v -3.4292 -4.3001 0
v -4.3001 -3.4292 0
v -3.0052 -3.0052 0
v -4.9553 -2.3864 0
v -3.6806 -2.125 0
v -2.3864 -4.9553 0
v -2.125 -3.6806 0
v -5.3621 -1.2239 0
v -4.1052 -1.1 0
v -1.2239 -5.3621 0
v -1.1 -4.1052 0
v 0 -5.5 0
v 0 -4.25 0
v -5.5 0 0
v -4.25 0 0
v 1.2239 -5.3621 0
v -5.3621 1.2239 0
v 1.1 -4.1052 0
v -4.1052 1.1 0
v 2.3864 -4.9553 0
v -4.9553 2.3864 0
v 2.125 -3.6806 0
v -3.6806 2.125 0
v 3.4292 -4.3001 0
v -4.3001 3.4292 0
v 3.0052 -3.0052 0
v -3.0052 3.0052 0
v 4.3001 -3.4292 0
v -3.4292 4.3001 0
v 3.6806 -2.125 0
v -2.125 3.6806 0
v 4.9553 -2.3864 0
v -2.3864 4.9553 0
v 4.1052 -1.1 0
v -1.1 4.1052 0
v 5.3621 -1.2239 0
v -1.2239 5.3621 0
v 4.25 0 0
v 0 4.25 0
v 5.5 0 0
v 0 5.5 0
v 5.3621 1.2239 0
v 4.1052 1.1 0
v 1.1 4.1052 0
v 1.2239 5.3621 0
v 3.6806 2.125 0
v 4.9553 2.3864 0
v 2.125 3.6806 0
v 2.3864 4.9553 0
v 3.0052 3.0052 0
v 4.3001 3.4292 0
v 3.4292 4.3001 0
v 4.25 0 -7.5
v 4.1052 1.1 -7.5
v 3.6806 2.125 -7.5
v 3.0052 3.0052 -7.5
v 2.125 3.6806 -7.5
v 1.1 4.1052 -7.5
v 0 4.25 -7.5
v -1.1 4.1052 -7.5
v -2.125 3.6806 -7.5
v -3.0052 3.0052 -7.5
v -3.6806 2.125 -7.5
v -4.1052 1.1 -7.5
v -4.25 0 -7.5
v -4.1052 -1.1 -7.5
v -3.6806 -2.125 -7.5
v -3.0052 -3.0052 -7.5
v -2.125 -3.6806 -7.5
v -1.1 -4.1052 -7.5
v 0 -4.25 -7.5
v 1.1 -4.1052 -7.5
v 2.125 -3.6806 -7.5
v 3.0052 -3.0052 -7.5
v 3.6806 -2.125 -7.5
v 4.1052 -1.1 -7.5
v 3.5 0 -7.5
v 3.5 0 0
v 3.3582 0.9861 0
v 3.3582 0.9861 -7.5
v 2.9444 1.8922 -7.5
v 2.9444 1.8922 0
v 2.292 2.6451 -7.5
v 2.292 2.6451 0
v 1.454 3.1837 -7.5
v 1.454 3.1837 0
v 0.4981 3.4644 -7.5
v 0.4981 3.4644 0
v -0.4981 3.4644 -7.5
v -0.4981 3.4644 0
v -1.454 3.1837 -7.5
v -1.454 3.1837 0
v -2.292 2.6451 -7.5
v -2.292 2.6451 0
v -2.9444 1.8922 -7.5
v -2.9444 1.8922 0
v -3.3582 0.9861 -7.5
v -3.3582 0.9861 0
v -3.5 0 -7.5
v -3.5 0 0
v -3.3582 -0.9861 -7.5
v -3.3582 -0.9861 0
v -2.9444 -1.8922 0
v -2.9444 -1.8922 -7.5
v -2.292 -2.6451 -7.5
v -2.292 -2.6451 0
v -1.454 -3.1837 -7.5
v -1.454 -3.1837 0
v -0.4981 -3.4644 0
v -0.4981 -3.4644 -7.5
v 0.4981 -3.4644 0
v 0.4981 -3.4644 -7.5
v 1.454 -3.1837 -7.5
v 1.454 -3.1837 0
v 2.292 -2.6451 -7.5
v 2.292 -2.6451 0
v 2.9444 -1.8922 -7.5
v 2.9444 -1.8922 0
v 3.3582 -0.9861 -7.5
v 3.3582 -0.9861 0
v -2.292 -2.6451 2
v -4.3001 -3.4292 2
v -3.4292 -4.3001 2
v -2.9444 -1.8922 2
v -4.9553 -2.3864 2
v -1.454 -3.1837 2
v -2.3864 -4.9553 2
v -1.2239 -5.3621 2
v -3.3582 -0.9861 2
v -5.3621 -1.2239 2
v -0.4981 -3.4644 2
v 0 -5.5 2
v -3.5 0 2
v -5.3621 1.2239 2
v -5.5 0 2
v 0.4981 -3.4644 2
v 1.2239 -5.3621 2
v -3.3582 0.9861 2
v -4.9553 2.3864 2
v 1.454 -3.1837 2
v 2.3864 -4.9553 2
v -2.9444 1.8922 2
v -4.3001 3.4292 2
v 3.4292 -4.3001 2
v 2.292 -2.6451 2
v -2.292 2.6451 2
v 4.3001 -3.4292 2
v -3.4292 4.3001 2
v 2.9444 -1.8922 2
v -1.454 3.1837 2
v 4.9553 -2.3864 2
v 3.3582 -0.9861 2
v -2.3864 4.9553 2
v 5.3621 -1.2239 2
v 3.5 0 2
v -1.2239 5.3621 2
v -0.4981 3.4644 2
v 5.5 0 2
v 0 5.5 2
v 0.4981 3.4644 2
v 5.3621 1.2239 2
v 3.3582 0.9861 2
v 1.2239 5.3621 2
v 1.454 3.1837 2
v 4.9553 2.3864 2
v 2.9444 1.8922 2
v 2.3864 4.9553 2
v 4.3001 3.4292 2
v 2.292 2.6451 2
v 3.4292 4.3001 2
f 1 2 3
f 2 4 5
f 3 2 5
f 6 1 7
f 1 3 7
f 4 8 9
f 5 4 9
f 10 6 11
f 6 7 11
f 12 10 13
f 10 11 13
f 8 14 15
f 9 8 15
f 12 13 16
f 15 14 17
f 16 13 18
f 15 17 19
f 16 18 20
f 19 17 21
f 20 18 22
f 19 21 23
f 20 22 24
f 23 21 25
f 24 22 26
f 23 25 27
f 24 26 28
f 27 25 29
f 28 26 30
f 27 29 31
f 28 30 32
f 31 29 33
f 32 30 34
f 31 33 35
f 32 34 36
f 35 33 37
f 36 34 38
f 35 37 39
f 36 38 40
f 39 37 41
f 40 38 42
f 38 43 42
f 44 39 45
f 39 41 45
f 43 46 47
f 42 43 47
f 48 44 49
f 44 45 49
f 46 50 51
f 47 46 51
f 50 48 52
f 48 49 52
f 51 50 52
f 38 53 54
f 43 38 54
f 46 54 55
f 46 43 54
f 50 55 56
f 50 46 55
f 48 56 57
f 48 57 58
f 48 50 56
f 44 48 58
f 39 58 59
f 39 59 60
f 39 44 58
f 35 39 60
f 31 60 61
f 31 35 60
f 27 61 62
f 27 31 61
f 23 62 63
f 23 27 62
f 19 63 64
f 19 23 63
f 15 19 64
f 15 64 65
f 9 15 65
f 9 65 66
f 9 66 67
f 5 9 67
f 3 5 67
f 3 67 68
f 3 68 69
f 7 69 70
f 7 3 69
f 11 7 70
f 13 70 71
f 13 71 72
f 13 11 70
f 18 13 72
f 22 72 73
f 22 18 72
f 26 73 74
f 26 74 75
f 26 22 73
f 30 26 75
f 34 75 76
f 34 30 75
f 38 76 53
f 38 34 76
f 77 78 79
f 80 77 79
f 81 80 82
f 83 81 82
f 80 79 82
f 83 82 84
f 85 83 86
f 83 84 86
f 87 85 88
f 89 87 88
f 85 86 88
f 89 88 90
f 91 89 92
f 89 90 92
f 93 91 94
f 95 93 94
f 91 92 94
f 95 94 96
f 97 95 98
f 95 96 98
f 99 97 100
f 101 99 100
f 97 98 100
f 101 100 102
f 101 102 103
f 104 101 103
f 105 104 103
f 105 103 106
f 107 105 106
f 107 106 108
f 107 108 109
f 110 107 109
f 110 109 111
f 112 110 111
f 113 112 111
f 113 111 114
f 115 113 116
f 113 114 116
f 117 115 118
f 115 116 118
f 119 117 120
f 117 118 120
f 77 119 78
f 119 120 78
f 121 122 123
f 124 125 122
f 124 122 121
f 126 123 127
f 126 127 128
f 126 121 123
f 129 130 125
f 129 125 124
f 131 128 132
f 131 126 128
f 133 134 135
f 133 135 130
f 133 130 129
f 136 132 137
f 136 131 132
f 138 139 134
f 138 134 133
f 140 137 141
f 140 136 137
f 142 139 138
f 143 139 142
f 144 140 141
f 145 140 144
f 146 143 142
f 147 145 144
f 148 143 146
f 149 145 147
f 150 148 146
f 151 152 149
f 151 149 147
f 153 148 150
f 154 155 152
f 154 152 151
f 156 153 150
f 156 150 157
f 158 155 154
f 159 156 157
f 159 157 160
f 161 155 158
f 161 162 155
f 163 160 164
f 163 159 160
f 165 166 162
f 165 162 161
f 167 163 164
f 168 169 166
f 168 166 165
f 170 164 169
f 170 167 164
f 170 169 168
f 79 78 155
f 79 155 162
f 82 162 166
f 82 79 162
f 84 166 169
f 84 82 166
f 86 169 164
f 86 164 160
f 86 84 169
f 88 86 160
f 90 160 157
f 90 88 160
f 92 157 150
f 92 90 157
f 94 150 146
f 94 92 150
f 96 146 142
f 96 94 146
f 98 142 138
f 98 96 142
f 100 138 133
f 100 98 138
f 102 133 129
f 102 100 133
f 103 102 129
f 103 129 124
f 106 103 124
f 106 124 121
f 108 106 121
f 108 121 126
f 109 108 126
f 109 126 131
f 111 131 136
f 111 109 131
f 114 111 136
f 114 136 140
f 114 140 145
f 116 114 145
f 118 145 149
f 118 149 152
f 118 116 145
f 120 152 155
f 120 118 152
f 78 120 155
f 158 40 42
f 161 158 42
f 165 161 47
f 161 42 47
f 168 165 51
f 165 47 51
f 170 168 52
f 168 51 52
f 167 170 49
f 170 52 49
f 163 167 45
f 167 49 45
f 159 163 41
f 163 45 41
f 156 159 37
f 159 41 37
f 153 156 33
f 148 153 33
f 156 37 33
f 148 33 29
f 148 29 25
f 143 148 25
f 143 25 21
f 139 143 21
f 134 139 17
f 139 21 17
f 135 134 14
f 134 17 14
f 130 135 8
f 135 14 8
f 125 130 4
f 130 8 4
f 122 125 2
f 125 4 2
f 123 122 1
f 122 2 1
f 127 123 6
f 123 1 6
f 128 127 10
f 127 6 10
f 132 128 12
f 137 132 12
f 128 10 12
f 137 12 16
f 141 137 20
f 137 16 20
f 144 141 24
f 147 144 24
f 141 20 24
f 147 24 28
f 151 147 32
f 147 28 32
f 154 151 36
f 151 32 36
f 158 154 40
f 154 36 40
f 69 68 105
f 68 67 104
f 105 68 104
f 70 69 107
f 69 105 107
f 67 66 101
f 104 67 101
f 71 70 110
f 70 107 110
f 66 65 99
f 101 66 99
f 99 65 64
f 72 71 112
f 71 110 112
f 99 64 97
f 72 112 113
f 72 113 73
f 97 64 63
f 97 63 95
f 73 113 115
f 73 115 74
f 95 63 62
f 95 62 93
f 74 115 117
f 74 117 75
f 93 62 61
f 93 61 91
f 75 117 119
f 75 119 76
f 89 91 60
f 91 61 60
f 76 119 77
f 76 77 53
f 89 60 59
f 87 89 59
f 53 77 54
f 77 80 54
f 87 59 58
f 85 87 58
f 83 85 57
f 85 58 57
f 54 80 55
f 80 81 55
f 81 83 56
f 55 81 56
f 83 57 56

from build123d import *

# Parameters (mm, degrees)
F0_R     = 5.5
F0_R_2   = 4.25
F0_R_3   = 3.5
F1_DEPTH = 2
F2_DEPTH = 7.5


# Not quite as in the source:
# - a feature names something its author has since deleted; it is built from what else it names


with BuildPart() as f1:
    # F0 (on Top) → F1 (new body)
    with BuildSketch(Plane.XY):
        Circle(F0_R)
        Circle(F0_R_2, mode=Mode.SUBTRACT)
        Circle(F0_R_2)
        Circle(F0_R_3, mode=Mode.SUBTRACT)
    extrude(amount=F1_DEPTH)

    # F0 (on Top) → F2 (join)
    with BuildSketch(Plane.XY):
        Circle(F0_R_2)
        Circle(F0_R_3, mode=Mode.SUBTRACT)
    extrude(amount=-F2_DEPTH)


solid = f1.part
